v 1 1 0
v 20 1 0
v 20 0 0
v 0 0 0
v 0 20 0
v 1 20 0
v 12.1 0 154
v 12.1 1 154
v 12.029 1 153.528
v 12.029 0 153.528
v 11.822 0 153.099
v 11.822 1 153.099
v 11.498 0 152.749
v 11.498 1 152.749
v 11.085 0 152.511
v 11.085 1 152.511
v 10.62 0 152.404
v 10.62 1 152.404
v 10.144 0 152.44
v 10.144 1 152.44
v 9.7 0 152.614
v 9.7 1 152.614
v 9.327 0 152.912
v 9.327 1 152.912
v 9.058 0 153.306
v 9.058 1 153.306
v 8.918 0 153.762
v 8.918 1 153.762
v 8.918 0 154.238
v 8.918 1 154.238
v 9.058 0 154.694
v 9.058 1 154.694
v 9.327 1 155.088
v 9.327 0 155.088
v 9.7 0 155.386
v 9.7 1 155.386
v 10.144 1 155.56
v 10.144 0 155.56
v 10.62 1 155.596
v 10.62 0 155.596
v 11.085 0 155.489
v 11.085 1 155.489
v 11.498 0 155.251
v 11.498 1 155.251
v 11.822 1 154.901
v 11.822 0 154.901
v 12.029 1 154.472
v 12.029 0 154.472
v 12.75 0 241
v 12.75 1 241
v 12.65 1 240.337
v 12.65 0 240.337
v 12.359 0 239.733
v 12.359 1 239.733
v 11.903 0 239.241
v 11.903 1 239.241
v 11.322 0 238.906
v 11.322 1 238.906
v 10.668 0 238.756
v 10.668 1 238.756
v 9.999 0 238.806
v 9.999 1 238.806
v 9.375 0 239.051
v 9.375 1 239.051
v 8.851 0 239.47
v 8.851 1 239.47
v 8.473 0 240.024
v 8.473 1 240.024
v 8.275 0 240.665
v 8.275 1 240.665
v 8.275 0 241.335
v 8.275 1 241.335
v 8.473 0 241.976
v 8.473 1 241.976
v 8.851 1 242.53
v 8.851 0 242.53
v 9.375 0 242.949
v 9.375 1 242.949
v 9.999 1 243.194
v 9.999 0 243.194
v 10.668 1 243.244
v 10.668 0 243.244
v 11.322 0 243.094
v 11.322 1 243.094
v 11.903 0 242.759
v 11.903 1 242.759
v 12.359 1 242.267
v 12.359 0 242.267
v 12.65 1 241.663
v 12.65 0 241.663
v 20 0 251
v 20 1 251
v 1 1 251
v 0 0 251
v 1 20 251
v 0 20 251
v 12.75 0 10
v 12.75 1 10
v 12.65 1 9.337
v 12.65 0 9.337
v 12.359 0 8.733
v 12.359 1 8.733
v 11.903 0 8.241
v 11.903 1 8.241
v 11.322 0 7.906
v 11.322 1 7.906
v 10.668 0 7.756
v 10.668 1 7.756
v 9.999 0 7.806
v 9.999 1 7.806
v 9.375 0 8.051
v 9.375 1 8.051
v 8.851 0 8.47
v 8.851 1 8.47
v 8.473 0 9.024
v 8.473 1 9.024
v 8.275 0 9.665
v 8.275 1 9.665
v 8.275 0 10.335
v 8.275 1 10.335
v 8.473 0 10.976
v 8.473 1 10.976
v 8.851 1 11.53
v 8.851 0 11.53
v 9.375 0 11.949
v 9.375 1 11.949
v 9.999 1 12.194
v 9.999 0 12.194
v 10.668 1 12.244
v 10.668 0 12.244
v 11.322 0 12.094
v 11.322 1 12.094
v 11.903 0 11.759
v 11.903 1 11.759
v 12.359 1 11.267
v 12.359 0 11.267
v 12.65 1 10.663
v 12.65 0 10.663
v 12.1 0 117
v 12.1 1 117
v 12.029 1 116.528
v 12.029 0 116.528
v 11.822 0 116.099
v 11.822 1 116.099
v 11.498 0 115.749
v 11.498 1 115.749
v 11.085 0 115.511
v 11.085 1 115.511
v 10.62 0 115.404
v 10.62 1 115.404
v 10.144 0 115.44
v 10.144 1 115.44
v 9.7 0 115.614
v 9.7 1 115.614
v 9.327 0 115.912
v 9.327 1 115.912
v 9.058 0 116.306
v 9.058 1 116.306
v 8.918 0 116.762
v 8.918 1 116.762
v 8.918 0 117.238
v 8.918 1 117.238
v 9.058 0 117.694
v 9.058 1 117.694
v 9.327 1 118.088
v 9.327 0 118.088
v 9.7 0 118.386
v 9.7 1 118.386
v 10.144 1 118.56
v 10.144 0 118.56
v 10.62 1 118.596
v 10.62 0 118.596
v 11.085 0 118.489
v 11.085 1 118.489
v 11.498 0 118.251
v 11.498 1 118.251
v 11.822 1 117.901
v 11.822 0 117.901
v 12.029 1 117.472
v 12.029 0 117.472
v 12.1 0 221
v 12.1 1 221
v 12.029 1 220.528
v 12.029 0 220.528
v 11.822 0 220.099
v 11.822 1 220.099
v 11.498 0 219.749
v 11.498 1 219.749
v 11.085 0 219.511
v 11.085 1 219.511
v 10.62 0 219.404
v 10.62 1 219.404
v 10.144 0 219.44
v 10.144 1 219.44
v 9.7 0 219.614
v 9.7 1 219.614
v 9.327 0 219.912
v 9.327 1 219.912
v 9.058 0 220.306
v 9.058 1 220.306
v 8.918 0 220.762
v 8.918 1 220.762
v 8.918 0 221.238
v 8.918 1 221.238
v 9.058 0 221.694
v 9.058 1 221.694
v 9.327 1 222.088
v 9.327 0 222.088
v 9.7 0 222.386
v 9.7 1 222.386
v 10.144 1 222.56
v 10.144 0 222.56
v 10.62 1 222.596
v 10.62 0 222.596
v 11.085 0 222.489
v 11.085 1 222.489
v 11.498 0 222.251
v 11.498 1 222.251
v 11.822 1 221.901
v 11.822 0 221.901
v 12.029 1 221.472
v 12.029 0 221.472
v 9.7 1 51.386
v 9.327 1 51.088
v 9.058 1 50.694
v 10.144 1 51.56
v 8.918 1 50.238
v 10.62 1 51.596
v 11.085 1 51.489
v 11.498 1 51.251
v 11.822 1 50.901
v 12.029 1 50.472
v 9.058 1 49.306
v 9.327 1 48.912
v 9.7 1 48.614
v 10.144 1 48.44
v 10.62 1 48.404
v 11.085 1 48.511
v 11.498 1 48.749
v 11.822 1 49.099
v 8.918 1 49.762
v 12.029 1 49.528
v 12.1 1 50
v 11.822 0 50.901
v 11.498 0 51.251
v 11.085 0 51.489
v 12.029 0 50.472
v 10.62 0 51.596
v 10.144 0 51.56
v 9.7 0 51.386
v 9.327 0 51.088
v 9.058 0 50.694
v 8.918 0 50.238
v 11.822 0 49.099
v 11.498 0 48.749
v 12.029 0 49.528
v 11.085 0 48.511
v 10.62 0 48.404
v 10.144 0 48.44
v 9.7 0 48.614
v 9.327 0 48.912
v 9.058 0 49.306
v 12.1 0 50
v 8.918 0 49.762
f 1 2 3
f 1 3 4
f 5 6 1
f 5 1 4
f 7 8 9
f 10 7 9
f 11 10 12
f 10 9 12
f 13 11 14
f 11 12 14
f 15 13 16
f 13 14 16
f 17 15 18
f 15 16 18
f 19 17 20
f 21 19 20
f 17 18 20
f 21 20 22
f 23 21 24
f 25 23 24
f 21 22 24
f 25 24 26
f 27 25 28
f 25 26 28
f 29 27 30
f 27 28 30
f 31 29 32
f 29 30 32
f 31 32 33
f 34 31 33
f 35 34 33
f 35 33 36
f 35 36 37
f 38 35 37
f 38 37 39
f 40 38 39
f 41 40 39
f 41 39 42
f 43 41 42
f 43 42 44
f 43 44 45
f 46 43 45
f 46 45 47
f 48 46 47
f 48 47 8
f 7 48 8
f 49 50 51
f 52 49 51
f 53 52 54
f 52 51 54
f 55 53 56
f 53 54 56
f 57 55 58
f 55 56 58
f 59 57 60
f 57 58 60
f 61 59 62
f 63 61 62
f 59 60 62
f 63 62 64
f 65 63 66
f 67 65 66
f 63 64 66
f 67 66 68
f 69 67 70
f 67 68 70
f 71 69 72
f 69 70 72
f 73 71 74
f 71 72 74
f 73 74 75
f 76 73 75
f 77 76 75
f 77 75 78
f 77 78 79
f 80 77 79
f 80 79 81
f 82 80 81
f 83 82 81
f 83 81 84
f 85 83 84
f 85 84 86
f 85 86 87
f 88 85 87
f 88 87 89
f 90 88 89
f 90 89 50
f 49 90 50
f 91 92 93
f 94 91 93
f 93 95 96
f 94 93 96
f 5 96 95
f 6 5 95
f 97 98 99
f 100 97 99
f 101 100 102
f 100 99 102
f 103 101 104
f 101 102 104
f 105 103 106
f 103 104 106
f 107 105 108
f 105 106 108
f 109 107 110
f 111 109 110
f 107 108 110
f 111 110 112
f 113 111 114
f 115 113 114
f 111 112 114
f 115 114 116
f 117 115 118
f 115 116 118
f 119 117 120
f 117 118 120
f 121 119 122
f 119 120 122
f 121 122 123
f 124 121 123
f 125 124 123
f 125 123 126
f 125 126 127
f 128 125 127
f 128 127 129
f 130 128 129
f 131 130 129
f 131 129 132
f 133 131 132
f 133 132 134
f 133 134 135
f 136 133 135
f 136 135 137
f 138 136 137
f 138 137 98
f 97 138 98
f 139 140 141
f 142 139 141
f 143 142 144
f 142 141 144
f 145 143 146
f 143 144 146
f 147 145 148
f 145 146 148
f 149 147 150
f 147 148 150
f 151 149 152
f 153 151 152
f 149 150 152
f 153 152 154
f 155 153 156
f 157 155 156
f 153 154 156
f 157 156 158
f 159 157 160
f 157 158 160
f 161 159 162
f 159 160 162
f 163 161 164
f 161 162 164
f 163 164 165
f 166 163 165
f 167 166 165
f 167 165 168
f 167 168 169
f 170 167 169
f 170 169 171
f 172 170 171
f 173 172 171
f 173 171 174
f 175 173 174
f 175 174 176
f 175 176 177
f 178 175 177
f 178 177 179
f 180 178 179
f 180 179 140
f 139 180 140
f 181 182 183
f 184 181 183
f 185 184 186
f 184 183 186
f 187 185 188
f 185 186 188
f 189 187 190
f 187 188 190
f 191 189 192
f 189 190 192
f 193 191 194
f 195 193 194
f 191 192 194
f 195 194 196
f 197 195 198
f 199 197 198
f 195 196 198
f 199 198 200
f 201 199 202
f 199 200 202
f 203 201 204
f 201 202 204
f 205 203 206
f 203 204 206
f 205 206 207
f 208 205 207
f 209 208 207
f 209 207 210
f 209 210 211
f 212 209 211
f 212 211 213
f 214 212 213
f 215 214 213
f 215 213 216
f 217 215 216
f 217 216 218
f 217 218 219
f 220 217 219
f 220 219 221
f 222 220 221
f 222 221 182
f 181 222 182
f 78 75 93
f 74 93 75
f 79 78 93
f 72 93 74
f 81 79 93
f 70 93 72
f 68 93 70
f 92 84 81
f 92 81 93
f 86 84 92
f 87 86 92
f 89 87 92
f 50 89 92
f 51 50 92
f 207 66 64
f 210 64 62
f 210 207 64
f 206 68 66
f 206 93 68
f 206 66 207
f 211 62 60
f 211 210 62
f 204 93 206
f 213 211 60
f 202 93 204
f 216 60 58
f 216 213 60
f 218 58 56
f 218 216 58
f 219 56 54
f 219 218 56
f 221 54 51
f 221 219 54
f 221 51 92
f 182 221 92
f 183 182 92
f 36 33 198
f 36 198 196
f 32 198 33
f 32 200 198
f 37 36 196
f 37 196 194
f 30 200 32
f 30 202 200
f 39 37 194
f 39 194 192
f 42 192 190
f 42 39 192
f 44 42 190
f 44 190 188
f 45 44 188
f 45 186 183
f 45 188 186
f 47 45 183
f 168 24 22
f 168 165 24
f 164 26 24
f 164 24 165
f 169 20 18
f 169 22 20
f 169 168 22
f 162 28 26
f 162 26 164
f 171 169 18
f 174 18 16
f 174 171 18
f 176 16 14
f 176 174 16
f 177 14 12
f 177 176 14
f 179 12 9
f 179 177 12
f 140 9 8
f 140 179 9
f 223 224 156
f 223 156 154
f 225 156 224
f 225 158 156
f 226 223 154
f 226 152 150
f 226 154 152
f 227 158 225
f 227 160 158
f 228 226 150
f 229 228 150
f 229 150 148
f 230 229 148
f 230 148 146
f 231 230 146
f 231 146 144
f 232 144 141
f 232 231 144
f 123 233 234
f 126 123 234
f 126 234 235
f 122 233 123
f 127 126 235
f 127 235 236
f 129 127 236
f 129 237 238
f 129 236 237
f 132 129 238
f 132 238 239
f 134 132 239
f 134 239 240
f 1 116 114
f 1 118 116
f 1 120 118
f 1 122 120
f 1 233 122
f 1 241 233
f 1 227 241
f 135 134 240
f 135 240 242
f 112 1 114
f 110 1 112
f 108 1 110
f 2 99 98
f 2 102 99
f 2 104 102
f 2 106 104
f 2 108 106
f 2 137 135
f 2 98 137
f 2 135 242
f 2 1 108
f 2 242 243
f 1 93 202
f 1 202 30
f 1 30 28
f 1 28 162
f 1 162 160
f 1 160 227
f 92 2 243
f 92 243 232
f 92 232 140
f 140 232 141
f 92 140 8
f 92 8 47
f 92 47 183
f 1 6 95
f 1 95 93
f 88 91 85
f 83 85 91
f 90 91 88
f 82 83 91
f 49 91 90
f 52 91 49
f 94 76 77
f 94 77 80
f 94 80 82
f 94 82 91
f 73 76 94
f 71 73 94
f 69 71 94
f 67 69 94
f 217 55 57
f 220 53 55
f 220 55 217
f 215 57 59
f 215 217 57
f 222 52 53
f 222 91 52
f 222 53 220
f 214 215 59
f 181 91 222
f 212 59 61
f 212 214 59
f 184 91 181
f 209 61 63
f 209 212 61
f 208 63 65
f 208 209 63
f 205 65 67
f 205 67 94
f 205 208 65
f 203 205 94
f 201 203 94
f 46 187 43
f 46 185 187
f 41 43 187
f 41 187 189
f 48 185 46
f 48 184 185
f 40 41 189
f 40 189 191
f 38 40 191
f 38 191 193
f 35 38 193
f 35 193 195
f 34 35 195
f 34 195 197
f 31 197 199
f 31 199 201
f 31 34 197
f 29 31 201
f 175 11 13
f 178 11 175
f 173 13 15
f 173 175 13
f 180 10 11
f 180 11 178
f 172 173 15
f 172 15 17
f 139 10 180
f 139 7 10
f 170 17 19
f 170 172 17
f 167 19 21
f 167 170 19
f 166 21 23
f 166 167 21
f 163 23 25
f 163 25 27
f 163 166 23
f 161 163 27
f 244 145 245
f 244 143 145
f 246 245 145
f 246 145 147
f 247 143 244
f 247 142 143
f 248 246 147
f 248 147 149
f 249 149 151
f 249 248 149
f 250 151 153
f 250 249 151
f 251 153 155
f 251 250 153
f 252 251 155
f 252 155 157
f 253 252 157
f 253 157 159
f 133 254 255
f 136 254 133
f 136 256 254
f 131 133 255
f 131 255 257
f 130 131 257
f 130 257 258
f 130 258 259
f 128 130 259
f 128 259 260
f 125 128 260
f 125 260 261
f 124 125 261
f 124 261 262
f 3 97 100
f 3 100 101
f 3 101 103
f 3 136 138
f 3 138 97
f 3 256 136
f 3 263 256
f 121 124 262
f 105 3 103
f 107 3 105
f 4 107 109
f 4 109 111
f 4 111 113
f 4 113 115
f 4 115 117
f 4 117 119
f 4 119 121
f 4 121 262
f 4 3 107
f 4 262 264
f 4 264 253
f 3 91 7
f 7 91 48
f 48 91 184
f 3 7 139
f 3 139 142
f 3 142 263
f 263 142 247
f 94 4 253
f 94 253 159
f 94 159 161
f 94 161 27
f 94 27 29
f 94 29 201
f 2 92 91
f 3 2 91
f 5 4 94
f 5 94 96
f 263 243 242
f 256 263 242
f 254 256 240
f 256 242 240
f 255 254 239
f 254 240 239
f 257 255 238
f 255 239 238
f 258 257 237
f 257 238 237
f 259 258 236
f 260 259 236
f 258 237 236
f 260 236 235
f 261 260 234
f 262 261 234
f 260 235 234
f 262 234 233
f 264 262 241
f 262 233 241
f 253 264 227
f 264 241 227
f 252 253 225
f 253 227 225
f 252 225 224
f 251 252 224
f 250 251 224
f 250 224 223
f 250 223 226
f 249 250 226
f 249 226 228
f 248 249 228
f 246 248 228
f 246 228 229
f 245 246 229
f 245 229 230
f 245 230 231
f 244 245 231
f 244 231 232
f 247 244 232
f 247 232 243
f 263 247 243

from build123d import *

# Parameters (mm, degrees)
EXTRUDE_1_DEPTH     = 251
SKETCH_2_R          = 1.6
CUT_EXTRUDE_1_DEPTH = 2
SKETCH_3_R          = 2.25
CUT_EXTRUDE_2_DEPTH = 2


with BuildPart() as part:
    # Эскиз1 → Бобышка-Вытянуть1 (new body)
    with BuildSketch(Plane.XY):
        Polygon((0, 0), (0, 20), (1, 20), (1, 1), (20, 1), (20, 0), align=None)
    extrude(amount=EXTRUDE_1_DEPTH)

    # Эскиз2 → Вырез-Вытянуть1 (cut, through all)
    with BuildSketch(Plane(origin=(0, 1, 0), x_dir=(1, 0, 0), z_dir=(0, 1, 0))):
        with Locations((10.5, -50)):
            Circle(SKETCH_2_R)
        with Locations((10.5, -117)):
            Circle(SKETCH_2_R)
        with Locations((10.5, -221)):
            Circle(SKETCH_2_R)
        with Locations((10.5, -154)):
            Circle(SKETCH_2_R)
    extrude(amount=-CUT_EXTRUDE_1_DEPTH, mode=Mode.SUBTRACT)

    # Эскиз3 → Вырез-Вытянуть2 (cut, through all)
    with BuildSketch(Plane(origin=(0, 1, 0), x_dir=(1, 0, 0), z_dir=(0, 1, 0))):
        with Locations((10.5, -241)):
            Circle(SKETCH_3_R)
        with Locations((10.5, -10)):
            Circle(SKETCH_3_R)
    extrude(amount=-CUT_EXTRUDE_2_DEPTH, mode=Mode.SUBTRACT)


solid = part.part
